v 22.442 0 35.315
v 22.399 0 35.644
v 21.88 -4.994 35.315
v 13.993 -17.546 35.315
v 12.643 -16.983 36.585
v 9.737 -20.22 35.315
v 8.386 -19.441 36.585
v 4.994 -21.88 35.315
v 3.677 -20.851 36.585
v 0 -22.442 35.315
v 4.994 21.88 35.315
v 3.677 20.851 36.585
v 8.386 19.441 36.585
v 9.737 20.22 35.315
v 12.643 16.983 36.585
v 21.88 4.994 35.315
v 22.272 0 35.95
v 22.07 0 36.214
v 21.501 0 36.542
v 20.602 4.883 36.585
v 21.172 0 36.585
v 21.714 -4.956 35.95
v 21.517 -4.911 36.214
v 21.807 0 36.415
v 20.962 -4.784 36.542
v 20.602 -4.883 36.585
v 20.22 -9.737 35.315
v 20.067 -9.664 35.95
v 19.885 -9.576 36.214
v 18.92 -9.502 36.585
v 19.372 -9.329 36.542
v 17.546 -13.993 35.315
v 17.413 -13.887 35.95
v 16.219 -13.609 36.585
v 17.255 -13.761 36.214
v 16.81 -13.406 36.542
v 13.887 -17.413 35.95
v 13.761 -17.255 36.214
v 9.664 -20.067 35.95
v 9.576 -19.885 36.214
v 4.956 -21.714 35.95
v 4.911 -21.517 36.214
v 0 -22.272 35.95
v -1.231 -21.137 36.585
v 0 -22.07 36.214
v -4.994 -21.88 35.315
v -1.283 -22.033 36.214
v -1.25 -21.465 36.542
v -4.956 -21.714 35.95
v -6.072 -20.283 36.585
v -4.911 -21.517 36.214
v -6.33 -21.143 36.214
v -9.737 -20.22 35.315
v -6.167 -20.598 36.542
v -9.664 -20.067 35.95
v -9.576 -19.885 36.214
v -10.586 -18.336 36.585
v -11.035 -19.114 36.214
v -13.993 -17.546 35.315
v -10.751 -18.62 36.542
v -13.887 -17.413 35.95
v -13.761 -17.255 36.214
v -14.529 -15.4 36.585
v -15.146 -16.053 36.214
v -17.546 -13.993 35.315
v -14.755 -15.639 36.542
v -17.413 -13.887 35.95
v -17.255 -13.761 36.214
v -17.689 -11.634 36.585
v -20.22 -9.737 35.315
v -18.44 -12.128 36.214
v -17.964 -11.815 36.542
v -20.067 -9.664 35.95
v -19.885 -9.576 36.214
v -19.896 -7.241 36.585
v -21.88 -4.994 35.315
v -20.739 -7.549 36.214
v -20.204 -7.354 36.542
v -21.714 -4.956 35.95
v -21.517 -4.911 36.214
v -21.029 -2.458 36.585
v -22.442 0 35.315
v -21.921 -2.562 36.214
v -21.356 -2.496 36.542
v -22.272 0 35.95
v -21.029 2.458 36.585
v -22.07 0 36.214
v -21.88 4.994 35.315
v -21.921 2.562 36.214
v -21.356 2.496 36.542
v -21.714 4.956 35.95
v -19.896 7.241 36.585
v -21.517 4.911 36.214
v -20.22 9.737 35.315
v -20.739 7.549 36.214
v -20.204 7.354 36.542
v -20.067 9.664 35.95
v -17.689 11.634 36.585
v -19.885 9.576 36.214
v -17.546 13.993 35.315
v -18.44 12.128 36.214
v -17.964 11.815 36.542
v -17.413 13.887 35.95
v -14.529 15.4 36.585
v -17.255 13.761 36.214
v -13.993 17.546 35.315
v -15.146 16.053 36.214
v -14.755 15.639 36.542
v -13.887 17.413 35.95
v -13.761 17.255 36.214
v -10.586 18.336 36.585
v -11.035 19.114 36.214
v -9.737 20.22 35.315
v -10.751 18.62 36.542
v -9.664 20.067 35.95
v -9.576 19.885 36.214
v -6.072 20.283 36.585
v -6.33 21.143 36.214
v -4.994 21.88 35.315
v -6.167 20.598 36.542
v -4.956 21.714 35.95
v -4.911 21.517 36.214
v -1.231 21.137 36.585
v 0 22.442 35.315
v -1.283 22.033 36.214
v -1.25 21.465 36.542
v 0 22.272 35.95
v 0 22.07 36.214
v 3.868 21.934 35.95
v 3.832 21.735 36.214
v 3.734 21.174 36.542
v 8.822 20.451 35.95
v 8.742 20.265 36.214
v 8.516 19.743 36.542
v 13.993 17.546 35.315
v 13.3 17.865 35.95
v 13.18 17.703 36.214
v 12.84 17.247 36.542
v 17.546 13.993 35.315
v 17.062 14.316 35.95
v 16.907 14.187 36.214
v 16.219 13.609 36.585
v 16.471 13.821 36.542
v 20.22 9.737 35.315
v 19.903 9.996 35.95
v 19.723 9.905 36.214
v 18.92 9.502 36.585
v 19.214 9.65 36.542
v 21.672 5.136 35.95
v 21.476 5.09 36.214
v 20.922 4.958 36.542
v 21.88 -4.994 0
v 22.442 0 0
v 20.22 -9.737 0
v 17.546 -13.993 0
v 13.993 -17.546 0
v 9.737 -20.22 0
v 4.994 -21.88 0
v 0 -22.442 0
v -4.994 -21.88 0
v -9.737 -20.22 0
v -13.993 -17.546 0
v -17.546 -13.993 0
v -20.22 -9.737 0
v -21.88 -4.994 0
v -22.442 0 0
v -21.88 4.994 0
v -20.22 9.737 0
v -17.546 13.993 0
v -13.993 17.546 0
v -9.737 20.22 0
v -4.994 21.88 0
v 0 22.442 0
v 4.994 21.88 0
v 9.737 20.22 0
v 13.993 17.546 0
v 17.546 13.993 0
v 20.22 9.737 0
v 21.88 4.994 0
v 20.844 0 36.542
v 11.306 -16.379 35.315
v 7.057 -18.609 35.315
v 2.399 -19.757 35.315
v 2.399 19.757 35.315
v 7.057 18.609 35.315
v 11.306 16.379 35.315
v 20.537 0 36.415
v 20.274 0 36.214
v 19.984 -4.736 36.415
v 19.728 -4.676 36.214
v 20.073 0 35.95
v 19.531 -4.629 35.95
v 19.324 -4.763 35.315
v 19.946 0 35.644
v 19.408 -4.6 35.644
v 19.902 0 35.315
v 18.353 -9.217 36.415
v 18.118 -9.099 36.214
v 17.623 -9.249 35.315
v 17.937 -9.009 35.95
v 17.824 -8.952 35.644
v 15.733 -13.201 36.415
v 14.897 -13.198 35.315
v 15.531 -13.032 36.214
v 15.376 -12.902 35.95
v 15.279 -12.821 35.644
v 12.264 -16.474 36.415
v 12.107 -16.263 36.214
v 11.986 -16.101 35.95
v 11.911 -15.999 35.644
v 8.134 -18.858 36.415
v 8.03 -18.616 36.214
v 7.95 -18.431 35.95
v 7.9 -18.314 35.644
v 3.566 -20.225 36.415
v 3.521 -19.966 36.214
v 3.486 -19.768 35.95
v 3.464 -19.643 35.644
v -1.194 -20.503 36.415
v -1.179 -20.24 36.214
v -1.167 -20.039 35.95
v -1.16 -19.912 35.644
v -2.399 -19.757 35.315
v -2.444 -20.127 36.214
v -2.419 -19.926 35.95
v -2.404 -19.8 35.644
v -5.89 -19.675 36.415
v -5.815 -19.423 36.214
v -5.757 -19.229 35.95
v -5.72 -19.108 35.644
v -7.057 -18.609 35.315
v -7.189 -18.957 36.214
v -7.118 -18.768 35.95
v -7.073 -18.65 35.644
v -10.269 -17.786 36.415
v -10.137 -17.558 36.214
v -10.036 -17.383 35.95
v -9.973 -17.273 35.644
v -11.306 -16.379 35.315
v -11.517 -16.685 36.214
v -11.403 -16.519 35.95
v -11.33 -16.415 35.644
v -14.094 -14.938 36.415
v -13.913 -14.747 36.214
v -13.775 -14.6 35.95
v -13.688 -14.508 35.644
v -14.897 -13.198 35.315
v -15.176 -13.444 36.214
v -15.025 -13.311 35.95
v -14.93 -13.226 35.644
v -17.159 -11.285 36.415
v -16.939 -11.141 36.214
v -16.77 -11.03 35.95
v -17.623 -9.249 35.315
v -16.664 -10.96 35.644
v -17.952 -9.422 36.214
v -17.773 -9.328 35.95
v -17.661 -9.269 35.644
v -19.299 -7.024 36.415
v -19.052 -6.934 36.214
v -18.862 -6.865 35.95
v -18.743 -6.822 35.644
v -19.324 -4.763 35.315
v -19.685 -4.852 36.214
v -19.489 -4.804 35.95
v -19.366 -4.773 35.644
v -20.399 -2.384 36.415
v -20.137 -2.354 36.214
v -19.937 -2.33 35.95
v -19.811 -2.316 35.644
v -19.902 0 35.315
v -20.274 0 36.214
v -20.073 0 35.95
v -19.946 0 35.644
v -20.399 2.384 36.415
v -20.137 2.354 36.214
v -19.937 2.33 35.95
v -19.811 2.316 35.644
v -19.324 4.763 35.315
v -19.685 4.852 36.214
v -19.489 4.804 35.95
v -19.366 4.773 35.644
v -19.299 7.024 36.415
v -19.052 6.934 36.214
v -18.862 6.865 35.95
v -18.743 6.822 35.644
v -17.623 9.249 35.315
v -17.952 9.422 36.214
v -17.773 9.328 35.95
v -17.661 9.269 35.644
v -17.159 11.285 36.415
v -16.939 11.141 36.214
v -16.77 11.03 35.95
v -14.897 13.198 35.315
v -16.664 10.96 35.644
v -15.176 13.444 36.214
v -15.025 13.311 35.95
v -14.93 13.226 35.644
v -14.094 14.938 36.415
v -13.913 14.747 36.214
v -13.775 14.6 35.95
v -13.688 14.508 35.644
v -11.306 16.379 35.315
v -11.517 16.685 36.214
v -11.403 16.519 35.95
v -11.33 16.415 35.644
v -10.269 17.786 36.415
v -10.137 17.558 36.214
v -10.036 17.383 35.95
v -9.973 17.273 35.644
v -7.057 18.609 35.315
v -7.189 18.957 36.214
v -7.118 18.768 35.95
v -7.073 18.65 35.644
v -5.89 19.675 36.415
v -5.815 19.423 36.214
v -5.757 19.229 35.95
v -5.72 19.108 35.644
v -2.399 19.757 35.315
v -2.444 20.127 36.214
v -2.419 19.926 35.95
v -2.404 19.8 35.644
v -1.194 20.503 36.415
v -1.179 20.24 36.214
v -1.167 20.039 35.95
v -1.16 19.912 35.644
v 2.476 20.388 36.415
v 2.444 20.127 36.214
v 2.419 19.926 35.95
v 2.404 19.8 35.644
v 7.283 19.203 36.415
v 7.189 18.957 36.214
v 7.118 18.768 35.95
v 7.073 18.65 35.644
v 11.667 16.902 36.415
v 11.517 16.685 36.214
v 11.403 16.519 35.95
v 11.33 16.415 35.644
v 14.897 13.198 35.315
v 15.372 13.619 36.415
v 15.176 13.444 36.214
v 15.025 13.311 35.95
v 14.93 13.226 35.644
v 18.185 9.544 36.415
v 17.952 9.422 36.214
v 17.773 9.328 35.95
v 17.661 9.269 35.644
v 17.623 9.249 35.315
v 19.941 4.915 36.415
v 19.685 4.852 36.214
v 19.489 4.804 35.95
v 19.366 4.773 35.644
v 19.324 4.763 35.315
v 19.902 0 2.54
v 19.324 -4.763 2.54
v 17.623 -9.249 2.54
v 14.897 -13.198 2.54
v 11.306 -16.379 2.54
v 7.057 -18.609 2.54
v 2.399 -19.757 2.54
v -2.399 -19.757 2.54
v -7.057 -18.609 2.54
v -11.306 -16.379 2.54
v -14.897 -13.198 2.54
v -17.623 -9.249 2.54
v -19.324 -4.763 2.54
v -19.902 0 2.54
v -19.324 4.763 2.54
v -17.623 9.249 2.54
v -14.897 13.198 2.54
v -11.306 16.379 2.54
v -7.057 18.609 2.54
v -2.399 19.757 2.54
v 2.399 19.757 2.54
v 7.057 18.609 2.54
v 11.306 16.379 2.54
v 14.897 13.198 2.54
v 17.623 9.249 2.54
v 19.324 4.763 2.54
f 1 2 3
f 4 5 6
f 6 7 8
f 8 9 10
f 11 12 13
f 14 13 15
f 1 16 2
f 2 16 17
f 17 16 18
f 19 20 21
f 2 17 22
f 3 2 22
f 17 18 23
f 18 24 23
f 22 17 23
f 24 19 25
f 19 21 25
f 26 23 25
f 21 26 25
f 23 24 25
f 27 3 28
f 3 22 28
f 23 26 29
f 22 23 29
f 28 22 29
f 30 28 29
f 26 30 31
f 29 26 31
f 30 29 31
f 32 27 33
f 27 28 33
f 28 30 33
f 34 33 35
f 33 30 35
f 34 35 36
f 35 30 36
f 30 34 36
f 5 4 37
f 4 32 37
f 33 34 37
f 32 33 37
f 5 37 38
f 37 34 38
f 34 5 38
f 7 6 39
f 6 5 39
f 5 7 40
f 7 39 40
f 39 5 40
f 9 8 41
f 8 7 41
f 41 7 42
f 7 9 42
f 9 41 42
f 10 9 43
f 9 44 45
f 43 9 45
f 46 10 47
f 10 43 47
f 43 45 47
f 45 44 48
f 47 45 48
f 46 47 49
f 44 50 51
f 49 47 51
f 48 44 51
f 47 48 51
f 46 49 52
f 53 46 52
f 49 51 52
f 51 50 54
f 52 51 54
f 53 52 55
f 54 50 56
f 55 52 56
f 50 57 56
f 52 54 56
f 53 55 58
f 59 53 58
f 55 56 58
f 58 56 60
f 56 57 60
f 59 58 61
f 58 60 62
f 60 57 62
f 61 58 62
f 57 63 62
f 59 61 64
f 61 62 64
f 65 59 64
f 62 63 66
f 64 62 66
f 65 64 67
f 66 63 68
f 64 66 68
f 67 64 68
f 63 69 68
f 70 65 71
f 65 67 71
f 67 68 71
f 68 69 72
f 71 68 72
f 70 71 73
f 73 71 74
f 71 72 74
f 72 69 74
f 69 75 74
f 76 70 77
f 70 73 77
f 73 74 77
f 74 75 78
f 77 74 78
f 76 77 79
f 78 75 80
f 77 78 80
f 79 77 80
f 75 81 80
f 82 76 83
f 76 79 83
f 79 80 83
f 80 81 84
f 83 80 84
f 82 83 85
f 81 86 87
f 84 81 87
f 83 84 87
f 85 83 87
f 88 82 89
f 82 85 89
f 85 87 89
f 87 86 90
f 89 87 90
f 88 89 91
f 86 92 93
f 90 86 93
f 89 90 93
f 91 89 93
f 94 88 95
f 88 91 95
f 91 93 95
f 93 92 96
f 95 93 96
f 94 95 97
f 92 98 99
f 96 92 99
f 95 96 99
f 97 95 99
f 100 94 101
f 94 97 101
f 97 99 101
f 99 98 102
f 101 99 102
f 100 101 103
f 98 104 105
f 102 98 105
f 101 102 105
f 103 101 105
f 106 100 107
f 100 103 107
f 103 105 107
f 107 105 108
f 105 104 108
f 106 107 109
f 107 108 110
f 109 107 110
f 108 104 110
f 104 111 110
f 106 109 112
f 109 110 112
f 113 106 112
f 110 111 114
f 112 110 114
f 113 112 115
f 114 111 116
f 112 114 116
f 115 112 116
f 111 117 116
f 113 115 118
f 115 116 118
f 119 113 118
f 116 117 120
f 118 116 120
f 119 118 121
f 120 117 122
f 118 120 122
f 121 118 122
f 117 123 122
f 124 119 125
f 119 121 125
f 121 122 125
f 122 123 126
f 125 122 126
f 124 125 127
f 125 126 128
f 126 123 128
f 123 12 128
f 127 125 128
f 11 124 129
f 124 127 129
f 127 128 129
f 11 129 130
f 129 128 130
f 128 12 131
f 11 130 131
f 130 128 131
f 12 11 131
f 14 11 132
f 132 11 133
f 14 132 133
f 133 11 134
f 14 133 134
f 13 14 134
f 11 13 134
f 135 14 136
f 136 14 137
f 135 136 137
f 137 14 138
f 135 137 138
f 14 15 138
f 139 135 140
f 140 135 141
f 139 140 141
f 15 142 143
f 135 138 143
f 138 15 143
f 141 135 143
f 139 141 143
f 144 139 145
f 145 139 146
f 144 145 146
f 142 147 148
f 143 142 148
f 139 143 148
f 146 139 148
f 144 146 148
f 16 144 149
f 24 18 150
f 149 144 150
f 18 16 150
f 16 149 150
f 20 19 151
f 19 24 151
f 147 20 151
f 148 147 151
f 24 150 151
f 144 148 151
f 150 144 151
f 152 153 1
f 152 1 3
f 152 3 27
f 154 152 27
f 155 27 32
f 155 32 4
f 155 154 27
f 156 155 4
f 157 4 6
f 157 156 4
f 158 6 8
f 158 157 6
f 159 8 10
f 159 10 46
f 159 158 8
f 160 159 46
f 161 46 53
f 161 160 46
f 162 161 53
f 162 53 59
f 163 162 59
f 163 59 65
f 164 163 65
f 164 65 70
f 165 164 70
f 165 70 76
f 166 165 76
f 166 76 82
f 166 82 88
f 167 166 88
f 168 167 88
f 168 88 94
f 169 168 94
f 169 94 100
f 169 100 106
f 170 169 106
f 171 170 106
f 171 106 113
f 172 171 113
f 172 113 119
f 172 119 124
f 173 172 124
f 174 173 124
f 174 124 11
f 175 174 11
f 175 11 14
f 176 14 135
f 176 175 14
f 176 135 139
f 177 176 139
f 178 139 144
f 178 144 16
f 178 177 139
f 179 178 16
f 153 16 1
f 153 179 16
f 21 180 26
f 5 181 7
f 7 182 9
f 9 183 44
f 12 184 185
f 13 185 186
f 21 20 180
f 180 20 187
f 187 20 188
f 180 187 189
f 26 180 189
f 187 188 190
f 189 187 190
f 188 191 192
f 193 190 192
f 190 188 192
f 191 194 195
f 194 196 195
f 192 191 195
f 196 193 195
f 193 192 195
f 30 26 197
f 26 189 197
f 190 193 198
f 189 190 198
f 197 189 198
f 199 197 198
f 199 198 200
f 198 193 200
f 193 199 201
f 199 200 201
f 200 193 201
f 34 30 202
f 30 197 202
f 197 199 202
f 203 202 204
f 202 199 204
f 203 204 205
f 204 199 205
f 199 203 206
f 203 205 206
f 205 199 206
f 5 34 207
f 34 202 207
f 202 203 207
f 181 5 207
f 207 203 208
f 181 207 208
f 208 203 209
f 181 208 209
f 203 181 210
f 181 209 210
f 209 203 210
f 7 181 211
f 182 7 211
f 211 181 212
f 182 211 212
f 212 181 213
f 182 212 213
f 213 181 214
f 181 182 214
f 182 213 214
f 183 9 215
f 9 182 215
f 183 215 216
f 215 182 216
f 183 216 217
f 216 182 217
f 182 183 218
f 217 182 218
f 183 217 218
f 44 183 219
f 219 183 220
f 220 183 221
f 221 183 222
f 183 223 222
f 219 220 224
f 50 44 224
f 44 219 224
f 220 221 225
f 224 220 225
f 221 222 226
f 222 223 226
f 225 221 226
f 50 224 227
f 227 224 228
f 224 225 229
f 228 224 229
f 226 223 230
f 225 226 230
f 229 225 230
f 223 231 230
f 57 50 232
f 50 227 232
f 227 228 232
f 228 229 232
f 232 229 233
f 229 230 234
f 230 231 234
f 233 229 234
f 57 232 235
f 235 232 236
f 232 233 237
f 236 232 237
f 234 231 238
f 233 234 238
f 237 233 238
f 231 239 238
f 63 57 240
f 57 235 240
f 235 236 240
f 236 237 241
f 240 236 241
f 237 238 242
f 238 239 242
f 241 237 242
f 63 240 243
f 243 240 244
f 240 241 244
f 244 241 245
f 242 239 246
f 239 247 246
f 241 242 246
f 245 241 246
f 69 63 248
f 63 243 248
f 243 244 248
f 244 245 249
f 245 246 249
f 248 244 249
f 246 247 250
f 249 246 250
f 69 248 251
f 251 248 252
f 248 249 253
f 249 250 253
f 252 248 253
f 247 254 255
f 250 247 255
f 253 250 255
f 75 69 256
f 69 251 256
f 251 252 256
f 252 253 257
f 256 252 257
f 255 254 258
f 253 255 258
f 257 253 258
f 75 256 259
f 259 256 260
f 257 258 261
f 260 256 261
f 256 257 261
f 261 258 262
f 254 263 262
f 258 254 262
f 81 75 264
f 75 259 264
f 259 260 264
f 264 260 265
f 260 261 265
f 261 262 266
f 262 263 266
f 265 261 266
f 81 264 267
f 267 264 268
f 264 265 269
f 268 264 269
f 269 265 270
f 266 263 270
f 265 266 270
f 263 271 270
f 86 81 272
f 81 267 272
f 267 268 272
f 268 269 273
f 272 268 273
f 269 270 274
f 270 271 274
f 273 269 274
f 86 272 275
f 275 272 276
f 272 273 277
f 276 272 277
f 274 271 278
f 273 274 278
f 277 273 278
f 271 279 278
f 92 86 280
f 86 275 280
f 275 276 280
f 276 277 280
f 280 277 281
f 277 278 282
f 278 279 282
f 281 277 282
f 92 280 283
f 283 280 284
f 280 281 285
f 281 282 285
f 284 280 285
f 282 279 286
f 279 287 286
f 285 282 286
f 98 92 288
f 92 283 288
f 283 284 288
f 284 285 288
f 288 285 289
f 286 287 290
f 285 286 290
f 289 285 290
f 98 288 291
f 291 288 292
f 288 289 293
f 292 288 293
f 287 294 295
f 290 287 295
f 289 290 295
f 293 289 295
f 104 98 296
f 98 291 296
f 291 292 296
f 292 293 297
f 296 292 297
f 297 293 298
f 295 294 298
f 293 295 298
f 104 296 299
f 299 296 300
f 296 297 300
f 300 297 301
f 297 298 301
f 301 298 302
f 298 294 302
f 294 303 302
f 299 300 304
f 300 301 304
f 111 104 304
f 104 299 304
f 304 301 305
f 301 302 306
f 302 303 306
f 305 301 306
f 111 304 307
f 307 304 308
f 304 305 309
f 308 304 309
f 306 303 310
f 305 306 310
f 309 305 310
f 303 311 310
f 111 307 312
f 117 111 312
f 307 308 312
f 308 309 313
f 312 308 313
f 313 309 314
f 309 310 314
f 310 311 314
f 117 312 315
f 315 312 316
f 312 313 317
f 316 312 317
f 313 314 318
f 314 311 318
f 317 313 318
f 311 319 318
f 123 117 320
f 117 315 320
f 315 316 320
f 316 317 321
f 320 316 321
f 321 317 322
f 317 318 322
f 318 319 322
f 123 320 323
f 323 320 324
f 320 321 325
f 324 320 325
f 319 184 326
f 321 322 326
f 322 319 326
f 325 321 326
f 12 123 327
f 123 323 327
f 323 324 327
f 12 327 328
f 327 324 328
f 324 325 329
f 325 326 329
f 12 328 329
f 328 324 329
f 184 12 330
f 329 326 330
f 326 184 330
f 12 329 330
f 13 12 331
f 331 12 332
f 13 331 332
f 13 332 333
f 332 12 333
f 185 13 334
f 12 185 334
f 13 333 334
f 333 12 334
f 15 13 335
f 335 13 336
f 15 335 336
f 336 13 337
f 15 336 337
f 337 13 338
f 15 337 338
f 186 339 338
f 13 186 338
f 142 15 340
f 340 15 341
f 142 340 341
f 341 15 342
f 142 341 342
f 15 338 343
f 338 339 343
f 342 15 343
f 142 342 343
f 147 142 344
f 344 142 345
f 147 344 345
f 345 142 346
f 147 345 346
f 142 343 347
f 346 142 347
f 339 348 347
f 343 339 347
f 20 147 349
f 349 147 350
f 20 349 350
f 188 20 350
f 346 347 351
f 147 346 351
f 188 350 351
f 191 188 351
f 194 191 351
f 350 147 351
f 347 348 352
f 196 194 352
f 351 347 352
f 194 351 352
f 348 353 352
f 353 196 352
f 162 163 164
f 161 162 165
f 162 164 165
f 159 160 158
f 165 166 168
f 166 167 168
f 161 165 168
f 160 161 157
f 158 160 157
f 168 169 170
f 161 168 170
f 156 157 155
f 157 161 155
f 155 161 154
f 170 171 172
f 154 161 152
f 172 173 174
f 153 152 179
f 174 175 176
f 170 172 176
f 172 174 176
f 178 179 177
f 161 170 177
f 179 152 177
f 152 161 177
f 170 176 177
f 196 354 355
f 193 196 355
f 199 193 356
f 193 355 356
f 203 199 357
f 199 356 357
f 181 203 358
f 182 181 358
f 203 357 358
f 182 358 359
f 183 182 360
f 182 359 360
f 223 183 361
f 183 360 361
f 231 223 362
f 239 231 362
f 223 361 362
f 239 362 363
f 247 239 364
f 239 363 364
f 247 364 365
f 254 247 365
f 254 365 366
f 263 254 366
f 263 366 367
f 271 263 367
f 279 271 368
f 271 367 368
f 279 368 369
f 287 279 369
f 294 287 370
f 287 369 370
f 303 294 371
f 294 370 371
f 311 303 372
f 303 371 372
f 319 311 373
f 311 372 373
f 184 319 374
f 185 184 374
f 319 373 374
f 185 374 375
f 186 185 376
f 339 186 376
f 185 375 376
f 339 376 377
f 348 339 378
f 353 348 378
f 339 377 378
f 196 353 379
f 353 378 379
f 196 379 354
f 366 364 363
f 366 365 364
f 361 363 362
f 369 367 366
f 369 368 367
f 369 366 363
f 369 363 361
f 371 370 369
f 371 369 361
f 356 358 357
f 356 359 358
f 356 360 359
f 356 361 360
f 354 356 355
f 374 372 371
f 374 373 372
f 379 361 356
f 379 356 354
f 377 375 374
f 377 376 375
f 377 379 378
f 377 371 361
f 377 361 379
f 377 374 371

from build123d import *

# Parameters (mm, degrees)
F1_R = 22.4423927589
F3_T = -2.54
F4_R = 1.26999


# Not quite as in the source:
# - a fillet or chamfer is up to 0.001 mm smaller than in the source, because OpenCascade refuses the exact size


with BuildPart() as f2:
    # F2: sweep along a path in F0
    with BuildLine(Plane.XZ) as f2_path:
        Line((-22.9121223092, 36.5854799747), (-22.9121223092, 0))
    # F1 (on Top) → F2 (sweep)
    with BuildSketch(Plane.XY):
        Circle(F1_R)
    sweep(path=f2_path.line)

    # F3
    f3_openings = [f2.faces().sort_by_distance(p)[0] for p in [
        (0, 0, 36.58548),
    ]]
    offset(amount=F3_T, openings=f3_openings)

    # F4 (radius 1.27 in the source; OpenCascade refuses exactly that, so slightly less here)
    f4_edges = [f2.edges().sort_by_distance(p)[0] for p in [
        (-22.442393, 0, 36.58548),
        (-19.902393, 0, 36.58548),
    ]]
    fillet(f4_edges, radius=F4_R)


solid = f2.part
